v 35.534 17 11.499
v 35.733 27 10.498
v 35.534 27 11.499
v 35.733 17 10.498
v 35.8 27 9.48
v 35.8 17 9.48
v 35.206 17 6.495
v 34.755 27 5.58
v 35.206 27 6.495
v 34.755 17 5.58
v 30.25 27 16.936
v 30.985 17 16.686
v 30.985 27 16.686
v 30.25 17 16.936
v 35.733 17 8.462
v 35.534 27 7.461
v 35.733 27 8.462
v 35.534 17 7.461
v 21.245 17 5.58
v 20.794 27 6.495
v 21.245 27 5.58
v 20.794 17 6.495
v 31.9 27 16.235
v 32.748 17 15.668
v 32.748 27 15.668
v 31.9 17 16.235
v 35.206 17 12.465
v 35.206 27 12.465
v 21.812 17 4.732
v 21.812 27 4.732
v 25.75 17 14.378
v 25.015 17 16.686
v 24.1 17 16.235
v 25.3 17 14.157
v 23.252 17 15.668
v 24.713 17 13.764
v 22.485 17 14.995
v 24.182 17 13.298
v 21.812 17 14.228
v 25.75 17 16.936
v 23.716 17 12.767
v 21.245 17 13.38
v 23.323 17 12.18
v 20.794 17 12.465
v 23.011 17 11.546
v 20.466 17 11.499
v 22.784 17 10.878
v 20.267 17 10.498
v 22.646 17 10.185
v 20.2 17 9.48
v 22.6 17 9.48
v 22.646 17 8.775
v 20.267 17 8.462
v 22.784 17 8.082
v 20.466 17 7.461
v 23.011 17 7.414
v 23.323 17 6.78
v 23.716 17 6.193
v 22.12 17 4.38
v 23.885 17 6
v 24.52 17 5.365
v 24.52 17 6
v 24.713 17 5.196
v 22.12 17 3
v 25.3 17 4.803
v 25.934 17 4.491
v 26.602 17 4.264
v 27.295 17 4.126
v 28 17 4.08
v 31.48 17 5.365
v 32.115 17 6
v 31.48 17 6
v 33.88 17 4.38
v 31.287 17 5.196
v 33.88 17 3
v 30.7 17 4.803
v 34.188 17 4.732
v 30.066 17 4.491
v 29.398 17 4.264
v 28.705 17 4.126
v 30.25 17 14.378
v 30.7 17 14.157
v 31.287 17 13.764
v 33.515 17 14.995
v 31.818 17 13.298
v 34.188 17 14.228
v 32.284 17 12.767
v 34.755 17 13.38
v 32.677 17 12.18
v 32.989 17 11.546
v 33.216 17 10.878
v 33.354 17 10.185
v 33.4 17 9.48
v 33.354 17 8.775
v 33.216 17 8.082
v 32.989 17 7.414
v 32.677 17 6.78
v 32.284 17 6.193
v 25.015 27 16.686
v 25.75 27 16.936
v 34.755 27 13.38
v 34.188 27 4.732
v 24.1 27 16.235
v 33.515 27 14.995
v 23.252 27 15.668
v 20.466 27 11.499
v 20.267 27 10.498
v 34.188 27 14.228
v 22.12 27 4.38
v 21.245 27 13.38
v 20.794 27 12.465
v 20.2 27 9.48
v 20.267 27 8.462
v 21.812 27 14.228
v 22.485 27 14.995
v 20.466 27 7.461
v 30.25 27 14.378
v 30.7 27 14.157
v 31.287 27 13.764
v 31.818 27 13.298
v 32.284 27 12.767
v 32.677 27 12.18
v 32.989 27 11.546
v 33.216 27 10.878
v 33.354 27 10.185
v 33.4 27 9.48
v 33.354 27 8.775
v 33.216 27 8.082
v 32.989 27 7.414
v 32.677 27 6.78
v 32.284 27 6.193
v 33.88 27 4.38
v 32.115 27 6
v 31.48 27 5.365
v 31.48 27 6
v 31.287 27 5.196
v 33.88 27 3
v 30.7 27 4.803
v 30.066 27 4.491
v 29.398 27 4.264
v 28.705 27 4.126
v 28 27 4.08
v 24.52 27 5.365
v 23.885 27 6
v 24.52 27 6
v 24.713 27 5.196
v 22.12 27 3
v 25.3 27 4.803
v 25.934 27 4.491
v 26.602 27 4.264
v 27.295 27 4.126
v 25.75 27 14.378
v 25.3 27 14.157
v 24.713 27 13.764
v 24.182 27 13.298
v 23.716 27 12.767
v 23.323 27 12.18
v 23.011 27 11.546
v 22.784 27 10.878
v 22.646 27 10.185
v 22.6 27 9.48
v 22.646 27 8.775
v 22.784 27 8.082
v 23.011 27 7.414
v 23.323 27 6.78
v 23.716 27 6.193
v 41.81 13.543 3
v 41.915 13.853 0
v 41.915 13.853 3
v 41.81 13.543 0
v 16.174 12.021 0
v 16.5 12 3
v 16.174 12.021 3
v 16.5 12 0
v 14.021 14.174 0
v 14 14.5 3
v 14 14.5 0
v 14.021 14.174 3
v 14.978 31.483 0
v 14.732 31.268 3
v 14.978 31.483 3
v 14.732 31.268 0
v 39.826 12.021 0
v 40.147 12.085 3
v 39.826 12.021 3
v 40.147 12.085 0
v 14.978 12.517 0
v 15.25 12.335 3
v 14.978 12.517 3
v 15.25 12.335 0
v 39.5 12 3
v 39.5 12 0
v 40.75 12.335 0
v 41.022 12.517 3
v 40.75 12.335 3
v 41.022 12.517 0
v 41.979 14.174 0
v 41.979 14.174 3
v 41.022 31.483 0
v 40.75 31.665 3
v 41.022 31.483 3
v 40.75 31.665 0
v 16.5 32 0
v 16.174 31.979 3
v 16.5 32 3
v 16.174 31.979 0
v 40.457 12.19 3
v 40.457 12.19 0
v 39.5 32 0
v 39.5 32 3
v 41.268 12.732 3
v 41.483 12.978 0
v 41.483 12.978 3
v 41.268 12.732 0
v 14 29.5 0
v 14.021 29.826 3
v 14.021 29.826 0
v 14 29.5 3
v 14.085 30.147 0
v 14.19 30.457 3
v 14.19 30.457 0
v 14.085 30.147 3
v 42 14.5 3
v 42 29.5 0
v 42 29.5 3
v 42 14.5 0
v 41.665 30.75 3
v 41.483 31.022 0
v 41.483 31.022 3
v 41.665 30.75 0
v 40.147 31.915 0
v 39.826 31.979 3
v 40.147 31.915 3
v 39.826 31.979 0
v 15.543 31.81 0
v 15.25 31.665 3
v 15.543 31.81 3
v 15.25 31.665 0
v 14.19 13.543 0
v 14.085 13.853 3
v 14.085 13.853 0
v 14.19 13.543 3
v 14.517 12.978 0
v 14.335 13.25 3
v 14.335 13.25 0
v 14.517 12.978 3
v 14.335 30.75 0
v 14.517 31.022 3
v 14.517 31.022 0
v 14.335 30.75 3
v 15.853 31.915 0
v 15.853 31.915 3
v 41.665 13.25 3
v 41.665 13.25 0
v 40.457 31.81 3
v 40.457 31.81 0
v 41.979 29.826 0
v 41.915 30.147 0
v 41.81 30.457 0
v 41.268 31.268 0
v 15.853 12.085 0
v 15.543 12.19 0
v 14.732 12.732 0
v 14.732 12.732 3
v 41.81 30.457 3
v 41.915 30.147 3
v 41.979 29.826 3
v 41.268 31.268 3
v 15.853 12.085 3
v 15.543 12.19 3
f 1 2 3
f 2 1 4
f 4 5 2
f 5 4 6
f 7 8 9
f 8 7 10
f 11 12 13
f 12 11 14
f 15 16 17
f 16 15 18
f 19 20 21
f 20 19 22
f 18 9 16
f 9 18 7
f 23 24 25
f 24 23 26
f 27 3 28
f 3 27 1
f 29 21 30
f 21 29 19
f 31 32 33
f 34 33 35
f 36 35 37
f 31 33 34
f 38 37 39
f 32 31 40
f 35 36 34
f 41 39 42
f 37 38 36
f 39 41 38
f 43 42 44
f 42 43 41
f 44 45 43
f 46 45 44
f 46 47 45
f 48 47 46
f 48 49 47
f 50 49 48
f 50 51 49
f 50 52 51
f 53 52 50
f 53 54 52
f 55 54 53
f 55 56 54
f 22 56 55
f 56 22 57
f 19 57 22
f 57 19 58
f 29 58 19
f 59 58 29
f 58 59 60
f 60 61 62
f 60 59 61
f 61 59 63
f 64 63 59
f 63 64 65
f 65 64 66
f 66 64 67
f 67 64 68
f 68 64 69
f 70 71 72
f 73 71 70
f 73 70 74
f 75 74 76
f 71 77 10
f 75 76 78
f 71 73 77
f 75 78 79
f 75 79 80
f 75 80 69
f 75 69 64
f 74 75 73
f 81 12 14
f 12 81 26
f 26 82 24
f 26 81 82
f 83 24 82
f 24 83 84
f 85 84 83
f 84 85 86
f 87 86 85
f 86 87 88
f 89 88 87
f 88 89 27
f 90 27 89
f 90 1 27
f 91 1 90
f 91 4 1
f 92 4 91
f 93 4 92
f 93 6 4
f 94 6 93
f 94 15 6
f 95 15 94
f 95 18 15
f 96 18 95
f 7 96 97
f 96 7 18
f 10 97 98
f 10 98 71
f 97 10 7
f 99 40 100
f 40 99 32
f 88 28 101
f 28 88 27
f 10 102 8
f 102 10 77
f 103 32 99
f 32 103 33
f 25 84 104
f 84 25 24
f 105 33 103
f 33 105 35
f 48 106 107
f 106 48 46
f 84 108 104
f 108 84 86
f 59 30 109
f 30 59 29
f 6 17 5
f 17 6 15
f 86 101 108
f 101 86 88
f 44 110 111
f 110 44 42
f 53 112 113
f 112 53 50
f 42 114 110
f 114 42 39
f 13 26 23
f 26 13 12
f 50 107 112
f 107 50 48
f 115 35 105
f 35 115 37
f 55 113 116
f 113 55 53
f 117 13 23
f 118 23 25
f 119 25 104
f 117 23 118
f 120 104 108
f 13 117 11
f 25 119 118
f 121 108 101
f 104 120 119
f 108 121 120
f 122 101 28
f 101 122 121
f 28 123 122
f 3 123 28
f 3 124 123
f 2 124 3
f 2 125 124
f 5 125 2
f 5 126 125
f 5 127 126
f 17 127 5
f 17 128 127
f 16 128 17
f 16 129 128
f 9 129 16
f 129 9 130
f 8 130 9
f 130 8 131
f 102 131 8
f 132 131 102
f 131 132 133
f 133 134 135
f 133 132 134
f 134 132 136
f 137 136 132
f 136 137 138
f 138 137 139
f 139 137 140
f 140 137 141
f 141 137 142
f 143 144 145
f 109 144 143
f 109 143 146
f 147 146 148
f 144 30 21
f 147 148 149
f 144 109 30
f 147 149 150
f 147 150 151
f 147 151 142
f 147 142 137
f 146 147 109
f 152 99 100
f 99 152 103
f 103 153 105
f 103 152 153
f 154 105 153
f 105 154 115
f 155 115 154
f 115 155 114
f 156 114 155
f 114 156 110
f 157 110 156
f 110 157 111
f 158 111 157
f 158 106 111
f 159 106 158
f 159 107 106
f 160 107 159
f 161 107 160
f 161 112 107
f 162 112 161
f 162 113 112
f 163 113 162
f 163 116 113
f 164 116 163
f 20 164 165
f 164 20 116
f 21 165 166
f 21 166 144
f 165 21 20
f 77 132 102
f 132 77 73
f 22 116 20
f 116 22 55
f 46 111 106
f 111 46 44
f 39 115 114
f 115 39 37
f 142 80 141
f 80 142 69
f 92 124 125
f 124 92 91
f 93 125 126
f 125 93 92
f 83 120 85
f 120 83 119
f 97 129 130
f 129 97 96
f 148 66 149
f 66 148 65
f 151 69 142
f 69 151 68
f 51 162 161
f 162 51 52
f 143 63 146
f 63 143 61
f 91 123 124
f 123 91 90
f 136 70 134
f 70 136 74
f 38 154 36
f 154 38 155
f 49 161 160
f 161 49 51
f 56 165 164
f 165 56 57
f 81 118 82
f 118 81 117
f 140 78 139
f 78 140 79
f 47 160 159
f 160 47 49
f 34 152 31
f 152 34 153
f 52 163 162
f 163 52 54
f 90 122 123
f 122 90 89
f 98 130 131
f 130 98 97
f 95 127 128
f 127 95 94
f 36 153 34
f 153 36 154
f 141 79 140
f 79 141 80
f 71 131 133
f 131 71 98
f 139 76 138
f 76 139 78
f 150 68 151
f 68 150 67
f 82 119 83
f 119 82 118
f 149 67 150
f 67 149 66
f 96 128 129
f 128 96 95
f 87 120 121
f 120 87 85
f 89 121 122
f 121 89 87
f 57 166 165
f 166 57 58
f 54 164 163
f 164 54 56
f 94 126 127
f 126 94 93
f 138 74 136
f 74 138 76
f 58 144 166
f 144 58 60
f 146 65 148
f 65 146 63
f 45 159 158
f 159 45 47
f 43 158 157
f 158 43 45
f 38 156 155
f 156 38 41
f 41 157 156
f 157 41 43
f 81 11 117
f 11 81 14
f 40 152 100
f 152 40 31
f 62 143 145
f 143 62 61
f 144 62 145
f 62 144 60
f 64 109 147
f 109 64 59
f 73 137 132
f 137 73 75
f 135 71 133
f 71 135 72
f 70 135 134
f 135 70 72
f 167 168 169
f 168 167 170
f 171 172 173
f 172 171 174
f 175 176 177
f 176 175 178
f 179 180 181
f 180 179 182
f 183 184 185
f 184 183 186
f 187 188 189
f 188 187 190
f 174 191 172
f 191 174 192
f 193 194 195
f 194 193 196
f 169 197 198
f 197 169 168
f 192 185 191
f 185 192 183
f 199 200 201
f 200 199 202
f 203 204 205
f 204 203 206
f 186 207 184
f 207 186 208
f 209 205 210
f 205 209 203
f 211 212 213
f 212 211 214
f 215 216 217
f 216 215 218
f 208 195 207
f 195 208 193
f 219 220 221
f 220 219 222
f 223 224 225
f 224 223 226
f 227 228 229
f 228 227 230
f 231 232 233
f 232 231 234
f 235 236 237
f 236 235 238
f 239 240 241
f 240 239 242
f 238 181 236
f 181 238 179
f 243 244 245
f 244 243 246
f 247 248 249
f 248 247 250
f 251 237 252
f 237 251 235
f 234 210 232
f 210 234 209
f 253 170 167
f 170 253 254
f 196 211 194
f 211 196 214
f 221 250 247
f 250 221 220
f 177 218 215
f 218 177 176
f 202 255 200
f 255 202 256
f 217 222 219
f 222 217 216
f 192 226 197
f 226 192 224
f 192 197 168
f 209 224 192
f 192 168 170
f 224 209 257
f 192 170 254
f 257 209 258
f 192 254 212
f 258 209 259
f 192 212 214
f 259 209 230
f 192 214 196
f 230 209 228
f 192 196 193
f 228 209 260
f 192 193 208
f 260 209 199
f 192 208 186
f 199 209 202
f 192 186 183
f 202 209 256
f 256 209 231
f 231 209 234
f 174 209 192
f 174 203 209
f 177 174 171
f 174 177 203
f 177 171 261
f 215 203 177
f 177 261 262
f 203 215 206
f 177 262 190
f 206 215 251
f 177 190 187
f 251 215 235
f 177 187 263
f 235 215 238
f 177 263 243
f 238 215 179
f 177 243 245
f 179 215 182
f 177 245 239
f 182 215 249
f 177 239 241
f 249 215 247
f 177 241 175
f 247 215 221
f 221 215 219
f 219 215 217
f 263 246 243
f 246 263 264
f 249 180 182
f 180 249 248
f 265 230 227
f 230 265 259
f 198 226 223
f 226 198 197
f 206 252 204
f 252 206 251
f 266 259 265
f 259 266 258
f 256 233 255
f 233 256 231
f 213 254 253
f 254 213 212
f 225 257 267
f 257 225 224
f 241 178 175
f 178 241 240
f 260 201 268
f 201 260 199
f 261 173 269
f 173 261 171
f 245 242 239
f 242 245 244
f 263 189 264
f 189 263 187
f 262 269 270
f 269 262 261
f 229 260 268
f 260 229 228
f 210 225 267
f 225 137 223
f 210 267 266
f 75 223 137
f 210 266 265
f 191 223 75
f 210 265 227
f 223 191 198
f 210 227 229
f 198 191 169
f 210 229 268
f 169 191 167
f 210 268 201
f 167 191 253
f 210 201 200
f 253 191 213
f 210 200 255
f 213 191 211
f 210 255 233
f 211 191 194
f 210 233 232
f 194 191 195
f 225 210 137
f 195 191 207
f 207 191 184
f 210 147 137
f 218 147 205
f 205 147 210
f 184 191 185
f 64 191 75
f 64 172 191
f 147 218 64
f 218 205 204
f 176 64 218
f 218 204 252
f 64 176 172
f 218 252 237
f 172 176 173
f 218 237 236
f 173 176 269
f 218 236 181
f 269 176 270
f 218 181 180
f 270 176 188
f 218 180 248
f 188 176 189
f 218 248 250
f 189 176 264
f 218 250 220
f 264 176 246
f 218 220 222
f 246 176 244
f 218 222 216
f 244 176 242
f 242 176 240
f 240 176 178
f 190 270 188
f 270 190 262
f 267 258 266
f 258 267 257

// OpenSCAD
/*
Sample 116: Wiederlösbarer Kabel-Schnappclip — Kabel 10 mm
Generated from the FDM Mechanical Sample Library.
Units: millimetres.

Override examples:
  openscad -o custom.stl -D 'view="plate"' -D 'render_fn=64' model.scad
  openscad -o preview.png -D 'view="assembly"' model.scad
*/
use <../../../library/fdm_mechanisms.scad>

render_fn = is_undef(render_fn) ? 48 : render_fn;
view = is_undef(view) ? "plate" : view;
$fn = render_fn;

sample_cable_clip(
    view=view,
    cable_d=10,
    clearance=0.4,
    wall=2.4
);
